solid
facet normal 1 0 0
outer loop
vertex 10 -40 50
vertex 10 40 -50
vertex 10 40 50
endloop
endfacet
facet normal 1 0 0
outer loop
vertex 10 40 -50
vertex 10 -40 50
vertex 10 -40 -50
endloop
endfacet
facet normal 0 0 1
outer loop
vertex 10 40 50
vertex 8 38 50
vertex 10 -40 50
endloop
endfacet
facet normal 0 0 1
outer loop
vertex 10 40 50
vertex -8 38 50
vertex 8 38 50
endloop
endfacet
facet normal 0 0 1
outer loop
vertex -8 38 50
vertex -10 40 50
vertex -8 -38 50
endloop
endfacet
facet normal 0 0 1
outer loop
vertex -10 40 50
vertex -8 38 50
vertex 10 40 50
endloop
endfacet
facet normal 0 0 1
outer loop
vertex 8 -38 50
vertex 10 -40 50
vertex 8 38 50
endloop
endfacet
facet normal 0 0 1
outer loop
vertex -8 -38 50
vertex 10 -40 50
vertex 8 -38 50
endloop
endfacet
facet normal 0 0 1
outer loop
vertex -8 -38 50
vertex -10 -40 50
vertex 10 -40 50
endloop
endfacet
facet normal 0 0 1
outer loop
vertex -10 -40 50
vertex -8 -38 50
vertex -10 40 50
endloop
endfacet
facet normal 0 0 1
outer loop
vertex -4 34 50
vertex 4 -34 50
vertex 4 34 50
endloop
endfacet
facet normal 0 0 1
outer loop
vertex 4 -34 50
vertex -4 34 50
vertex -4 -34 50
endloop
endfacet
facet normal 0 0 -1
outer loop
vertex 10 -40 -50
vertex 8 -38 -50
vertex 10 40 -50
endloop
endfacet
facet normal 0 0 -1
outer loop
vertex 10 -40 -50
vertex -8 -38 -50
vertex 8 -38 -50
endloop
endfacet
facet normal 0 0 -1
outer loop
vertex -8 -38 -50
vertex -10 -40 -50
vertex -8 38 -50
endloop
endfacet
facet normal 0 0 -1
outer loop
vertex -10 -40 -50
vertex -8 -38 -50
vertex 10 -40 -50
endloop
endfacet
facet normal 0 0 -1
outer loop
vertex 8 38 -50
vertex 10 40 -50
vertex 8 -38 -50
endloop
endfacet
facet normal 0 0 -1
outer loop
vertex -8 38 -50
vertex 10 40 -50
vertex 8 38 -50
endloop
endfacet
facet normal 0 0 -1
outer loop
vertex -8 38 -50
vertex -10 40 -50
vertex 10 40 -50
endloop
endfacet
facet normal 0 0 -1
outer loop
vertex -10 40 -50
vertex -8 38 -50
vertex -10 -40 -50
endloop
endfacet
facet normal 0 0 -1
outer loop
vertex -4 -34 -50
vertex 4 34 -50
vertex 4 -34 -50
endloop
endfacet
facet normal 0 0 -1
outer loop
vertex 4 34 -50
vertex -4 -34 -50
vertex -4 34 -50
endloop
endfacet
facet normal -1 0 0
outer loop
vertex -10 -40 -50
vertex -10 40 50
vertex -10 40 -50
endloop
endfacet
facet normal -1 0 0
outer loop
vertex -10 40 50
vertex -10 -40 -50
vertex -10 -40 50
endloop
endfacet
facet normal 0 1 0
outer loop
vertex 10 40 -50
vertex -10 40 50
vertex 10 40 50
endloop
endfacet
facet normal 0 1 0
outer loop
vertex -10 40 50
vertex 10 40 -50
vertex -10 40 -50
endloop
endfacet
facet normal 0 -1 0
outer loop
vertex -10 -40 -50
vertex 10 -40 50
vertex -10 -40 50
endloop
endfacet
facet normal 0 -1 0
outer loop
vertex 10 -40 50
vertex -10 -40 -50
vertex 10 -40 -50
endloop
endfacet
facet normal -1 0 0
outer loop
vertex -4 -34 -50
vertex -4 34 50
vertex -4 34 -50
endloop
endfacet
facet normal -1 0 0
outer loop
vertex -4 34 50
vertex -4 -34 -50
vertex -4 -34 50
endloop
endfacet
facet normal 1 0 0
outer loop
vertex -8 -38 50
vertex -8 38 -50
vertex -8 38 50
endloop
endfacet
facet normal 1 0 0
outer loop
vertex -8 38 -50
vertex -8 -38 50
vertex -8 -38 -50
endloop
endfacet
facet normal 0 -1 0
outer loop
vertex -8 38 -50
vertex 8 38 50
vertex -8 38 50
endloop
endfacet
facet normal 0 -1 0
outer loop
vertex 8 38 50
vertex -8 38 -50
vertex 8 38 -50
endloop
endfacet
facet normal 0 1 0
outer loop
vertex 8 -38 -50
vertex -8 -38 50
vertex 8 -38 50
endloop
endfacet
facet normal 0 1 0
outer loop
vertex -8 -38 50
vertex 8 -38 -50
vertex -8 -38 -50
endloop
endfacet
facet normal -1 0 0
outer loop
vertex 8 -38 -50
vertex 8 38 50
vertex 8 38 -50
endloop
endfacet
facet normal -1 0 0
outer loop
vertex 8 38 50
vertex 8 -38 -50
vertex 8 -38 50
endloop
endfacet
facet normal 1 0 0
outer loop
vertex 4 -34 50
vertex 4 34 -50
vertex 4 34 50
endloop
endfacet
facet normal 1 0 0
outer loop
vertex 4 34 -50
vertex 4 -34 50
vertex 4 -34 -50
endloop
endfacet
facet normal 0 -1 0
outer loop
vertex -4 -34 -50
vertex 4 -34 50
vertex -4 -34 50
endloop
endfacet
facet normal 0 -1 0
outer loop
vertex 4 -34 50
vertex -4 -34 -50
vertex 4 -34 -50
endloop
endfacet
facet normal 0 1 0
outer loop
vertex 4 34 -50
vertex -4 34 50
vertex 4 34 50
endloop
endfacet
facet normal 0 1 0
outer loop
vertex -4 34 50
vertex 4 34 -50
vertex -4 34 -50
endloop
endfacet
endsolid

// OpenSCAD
module aluminium_extrusion() {
    difference() {
        cube([20, 80, 100], center = true);
        translate([-8, -38, -50])
            cube([4, 76, 100]);
        translate([4, -38, -50])
            cube([4, 76, 100]);
        translate([-8, -38, -50])
            cube([16, 4, 100]);
        translate([-8, 34, -50])
            cube([16, 4, 100]);
    }
}

aluminium_extrusion();
